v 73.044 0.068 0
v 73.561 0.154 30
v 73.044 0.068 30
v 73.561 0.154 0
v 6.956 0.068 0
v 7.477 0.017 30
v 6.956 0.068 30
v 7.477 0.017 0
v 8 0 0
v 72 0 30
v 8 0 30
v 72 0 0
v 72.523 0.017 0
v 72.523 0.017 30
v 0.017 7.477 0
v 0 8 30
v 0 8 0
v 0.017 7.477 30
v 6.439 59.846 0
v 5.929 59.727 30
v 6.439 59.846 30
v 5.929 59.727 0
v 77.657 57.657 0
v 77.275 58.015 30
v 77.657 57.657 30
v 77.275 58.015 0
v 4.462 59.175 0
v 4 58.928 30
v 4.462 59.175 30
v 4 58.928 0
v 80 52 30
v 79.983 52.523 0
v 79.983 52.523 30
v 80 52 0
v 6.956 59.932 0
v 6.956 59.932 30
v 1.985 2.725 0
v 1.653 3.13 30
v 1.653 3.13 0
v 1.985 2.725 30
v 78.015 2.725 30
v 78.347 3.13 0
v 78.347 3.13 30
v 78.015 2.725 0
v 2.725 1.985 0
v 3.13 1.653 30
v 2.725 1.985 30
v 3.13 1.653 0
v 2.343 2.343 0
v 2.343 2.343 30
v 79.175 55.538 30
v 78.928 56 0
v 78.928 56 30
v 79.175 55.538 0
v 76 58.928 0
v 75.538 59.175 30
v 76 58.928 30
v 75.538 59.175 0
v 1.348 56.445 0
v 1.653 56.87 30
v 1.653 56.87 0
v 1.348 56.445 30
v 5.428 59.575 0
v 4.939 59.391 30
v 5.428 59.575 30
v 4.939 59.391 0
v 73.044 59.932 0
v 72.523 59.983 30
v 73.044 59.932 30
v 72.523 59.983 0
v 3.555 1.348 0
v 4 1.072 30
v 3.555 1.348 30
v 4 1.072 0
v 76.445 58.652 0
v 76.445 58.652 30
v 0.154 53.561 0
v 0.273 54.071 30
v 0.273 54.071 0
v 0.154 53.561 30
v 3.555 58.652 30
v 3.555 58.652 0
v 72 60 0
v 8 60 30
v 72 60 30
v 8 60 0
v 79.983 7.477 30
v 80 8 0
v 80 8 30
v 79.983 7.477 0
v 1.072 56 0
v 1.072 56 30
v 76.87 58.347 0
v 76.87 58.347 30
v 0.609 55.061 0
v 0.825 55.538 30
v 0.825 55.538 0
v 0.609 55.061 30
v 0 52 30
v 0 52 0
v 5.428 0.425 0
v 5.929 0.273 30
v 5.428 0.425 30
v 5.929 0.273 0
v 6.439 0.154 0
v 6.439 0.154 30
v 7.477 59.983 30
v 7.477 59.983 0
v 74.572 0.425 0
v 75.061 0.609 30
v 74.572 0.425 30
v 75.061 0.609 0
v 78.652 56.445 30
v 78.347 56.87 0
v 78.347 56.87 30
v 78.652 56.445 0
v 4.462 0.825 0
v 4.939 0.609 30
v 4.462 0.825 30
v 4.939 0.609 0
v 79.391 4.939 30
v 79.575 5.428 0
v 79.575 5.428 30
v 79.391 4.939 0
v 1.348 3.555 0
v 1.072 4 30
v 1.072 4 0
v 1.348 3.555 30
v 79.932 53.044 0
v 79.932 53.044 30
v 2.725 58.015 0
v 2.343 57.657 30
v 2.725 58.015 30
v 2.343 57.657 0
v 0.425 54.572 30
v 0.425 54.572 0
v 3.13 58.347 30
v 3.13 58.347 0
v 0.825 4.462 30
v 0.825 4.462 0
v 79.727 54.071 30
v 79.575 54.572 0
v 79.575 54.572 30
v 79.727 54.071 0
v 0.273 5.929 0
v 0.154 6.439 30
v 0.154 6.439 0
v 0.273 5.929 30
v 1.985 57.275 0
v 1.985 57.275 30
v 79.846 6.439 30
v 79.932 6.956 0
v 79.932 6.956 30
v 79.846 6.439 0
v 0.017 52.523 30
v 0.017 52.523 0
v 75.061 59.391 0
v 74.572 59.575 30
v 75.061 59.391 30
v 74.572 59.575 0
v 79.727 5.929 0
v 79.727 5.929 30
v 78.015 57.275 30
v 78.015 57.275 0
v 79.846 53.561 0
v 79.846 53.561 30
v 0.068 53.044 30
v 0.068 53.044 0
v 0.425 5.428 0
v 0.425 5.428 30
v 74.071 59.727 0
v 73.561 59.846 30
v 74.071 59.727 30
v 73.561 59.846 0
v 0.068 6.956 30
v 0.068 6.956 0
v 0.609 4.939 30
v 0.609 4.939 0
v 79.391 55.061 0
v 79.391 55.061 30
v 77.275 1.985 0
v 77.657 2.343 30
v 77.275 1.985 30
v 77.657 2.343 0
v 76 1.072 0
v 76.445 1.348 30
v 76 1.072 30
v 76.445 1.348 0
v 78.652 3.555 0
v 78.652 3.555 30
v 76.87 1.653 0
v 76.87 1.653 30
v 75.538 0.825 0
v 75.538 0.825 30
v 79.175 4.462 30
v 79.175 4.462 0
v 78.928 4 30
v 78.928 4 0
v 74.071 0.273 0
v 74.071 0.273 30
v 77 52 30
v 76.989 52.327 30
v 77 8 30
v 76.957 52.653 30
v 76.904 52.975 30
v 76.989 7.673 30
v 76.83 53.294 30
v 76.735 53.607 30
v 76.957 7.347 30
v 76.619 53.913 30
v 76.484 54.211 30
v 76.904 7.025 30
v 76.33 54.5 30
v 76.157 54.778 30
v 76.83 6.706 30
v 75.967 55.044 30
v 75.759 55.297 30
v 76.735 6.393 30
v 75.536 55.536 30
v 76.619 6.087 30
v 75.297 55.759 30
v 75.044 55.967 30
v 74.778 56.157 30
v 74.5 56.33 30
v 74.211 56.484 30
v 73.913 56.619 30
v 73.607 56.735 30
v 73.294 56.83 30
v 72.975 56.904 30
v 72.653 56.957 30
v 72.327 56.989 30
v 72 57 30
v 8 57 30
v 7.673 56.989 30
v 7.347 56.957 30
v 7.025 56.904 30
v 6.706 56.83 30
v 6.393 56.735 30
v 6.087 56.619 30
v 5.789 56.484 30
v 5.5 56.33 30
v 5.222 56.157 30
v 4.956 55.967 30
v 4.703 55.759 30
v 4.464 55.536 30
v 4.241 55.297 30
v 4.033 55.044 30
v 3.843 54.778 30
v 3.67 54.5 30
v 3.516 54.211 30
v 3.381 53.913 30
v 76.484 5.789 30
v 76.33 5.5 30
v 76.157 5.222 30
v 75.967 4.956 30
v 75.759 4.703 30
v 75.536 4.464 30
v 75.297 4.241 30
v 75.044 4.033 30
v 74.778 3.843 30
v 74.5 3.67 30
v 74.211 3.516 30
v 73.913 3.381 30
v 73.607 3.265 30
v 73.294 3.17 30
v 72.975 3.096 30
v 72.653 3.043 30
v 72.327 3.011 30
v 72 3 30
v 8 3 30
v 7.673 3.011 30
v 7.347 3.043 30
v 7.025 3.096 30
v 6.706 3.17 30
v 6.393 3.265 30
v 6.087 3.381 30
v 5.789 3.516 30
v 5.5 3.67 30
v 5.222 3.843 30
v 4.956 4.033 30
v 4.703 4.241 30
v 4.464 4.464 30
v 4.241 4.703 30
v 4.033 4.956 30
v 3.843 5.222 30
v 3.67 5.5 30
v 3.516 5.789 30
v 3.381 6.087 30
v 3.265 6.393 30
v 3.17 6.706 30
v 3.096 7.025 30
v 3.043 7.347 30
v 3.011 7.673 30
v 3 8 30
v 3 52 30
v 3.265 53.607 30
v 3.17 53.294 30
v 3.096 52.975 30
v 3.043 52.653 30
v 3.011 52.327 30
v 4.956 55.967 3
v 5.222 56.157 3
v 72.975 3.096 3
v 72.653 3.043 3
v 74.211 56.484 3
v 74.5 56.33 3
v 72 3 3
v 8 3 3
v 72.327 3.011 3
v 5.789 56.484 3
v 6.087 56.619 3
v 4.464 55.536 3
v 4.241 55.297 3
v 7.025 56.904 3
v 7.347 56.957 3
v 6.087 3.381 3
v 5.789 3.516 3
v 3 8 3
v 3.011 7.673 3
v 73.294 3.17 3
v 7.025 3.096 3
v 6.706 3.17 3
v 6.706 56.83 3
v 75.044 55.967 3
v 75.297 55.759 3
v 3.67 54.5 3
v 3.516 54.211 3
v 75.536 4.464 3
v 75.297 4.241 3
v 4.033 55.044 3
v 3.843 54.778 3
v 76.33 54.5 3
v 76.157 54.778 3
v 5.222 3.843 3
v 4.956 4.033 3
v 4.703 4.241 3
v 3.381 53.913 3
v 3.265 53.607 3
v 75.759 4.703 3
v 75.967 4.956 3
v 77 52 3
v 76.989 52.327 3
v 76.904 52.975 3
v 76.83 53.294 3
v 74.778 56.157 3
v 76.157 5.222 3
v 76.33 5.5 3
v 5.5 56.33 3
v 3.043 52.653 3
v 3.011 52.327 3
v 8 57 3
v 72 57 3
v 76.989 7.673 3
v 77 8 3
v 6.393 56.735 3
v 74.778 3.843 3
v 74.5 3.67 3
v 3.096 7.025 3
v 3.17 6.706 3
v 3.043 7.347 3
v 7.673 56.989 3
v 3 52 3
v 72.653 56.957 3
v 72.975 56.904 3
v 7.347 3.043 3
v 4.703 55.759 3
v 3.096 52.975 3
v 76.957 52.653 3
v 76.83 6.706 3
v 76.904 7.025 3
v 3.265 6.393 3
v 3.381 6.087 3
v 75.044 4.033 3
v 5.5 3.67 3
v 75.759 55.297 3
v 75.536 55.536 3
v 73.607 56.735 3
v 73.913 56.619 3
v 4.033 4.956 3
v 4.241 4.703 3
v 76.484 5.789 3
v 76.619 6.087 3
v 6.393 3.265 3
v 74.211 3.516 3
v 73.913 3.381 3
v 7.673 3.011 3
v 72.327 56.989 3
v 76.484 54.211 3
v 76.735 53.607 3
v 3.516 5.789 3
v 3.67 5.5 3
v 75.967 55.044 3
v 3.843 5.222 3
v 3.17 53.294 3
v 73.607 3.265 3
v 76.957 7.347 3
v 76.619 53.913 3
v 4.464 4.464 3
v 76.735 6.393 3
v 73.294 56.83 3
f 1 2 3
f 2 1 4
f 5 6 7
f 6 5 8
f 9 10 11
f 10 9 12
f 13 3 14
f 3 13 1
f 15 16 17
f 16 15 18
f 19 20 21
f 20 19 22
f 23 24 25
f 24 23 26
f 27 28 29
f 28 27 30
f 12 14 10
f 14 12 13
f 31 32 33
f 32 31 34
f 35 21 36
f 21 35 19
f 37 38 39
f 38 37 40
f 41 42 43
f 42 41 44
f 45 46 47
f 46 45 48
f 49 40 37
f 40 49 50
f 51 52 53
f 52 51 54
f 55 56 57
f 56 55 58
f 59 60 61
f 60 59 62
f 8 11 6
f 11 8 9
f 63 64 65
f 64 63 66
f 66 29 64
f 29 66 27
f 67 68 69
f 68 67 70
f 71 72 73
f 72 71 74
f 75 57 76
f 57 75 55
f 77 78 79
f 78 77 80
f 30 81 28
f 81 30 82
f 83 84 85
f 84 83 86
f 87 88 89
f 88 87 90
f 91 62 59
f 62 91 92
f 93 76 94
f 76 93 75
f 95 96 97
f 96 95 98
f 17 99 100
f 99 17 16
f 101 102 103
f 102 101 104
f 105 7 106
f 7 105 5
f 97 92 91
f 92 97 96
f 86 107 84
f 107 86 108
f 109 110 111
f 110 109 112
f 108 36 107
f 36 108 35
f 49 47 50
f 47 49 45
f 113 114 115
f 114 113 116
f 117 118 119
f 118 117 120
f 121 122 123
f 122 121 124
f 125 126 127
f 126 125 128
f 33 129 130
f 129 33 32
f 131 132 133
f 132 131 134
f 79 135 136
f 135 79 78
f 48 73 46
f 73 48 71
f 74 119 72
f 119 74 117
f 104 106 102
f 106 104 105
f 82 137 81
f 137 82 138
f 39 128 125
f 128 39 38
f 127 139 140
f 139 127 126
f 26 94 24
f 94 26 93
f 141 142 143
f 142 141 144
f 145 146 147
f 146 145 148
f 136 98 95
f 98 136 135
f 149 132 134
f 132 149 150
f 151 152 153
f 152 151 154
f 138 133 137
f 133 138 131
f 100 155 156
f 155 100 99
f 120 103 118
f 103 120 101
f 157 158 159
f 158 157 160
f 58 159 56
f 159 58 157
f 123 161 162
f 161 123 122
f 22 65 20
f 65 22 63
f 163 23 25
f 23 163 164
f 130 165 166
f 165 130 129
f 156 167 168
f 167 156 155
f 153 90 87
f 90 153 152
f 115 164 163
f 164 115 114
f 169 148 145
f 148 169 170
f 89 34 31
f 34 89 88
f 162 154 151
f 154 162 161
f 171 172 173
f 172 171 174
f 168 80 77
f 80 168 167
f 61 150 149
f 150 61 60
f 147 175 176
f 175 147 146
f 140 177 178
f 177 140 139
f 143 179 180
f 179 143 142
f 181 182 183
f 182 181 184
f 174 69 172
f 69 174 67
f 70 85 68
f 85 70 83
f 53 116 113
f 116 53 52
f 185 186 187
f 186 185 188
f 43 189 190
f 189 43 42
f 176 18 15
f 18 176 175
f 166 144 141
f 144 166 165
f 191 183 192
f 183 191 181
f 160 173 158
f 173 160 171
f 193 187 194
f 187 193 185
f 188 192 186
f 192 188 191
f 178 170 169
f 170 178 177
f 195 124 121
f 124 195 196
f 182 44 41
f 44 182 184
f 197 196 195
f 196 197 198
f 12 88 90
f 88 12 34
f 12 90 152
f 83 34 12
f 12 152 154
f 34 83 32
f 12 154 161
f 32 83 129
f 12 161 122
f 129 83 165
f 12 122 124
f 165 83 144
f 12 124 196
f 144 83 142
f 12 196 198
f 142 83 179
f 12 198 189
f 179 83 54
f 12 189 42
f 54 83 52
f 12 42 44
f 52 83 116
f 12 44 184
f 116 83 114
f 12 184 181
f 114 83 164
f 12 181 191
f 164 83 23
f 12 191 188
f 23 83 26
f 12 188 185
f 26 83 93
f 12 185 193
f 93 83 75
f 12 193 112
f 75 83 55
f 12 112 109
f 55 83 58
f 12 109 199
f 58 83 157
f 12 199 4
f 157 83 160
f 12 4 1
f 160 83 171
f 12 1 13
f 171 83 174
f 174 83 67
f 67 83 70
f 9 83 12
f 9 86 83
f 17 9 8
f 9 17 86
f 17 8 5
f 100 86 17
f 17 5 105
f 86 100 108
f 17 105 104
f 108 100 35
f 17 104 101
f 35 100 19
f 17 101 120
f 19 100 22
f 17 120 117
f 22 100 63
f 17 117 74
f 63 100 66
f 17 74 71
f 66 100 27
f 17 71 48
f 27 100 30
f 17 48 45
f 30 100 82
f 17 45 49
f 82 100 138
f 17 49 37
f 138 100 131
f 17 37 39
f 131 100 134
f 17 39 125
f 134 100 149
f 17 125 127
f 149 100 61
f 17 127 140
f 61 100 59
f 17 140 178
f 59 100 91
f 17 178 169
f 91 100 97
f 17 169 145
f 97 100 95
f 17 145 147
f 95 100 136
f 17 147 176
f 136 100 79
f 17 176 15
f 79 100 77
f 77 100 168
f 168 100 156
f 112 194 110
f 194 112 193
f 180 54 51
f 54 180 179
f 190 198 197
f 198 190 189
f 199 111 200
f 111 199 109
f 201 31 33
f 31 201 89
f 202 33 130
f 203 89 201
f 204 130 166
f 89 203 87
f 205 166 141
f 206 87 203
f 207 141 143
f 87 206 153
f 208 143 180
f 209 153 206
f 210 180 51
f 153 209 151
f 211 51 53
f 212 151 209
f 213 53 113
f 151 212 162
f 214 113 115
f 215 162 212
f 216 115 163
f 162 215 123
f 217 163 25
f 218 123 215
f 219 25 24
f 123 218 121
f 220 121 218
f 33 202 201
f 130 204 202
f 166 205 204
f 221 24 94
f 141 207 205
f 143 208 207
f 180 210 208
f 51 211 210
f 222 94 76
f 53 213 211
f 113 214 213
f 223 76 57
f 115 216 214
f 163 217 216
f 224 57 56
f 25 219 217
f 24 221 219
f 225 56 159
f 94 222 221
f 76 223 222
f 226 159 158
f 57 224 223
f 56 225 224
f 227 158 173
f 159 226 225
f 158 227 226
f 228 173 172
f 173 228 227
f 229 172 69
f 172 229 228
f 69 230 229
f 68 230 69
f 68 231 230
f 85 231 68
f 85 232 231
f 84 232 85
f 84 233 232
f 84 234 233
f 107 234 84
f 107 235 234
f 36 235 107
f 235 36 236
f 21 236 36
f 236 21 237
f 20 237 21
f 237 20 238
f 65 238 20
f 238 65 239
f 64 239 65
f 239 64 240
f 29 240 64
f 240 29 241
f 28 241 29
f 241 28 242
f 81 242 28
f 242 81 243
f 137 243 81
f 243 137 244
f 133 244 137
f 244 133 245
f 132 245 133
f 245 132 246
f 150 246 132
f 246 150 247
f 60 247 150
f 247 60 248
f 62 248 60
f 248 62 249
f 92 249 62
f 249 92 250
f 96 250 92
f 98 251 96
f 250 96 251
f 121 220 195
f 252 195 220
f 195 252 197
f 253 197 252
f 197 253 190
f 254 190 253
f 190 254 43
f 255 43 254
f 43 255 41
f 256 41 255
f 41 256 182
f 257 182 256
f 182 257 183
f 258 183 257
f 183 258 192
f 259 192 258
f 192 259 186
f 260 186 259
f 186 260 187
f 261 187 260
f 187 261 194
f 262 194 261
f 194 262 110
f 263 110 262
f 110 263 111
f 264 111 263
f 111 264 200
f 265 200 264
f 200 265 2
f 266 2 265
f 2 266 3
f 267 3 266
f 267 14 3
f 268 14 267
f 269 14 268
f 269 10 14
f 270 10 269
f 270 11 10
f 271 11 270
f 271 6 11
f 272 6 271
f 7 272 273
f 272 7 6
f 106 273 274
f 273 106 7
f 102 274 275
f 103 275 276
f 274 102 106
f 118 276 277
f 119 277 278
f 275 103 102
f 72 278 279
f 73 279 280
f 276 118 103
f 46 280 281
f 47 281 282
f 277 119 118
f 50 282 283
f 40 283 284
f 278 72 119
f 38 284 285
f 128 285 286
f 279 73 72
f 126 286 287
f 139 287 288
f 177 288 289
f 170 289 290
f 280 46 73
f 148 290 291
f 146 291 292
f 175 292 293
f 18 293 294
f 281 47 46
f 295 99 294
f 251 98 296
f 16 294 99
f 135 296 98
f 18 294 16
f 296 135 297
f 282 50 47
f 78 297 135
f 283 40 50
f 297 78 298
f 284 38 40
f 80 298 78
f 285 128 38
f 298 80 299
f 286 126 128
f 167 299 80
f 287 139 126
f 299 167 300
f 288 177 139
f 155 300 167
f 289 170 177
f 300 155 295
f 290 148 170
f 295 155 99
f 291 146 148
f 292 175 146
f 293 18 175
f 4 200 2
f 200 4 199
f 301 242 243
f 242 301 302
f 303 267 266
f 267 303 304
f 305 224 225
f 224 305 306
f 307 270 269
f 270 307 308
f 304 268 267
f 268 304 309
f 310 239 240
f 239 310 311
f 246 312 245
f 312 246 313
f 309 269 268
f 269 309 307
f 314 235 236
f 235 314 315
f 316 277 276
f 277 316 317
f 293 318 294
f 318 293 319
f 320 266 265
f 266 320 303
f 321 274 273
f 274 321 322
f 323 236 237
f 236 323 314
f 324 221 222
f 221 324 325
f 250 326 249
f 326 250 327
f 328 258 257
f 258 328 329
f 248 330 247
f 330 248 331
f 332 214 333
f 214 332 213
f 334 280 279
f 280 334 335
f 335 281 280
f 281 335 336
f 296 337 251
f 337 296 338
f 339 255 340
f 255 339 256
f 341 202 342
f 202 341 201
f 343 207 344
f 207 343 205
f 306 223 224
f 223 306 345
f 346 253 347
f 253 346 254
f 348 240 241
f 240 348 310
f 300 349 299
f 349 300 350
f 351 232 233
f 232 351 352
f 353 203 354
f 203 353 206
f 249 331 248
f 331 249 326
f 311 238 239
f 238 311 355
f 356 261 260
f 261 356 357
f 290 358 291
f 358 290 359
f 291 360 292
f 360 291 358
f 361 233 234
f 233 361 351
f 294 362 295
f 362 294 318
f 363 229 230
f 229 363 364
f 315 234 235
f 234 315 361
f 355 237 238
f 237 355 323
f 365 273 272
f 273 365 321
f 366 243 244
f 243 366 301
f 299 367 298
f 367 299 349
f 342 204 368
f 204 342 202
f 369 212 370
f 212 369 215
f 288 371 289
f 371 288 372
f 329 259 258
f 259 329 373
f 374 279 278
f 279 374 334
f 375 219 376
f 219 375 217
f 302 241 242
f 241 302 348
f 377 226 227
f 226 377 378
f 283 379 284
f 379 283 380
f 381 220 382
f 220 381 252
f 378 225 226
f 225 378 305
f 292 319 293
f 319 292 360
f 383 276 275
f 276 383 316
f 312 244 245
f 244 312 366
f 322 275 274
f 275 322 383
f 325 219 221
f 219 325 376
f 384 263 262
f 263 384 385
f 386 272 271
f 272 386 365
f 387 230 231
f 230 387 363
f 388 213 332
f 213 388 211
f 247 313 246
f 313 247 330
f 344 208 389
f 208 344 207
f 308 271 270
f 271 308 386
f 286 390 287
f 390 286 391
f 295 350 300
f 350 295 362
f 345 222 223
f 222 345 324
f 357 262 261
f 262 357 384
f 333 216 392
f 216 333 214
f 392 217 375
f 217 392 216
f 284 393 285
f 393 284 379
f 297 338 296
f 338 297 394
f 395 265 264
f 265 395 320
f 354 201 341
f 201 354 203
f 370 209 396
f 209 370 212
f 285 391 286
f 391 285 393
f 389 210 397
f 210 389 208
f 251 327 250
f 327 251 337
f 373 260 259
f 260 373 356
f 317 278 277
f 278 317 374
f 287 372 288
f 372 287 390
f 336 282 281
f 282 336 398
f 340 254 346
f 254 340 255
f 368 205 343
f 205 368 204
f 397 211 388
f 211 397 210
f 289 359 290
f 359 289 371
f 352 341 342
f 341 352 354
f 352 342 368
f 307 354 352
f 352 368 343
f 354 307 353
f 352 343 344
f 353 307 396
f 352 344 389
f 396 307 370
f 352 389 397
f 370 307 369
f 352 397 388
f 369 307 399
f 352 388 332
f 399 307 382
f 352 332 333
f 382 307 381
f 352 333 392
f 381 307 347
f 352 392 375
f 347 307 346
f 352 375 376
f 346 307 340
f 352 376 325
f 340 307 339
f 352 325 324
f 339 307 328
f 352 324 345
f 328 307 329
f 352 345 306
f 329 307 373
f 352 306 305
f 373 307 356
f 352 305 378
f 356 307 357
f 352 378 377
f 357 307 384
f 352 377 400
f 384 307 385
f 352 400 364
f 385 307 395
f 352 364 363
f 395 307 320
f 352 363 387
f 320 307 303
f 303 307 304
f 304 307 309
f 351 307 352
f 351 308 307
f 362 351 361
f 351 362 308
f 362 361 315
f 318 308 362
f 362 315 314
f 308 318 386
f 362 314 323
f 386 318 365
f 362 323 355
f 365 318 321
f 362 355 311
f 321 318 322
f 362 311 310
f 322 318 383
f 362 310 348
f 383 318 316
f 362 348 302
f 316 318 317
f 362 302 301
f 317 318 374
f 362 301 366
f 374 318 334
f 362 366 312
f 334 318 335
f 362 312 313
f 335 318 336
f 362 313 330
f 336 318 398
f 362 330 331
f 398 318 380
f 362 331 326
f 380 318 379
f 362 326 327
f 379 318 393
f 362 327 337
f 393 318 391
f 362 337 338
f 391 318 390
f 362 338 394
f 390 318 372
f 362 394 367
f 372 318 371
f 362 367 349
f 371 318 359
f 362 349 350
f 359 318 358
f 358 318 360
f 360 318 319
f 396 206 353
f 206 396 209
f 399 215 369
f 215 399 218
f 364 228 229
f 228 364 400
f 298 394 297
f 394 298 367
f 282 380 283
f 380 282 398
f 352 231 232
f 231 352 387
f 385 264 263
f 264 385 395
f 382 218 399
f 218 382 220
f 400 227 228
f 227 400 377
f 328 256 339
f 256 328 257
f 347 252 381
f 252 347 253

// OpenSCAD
$fn=96;
thickness=3;
module rr(w,d,r){translate([r,r]) offset(r=r) square([w-2*r,d-2*r]);} difference(){linear_extrude(30) rr(80,60,8); translate([thickness,thickness,thickness]) linear_extrude(31) rr(80-2*thickness,60-2*thickness,8-thickness);}
